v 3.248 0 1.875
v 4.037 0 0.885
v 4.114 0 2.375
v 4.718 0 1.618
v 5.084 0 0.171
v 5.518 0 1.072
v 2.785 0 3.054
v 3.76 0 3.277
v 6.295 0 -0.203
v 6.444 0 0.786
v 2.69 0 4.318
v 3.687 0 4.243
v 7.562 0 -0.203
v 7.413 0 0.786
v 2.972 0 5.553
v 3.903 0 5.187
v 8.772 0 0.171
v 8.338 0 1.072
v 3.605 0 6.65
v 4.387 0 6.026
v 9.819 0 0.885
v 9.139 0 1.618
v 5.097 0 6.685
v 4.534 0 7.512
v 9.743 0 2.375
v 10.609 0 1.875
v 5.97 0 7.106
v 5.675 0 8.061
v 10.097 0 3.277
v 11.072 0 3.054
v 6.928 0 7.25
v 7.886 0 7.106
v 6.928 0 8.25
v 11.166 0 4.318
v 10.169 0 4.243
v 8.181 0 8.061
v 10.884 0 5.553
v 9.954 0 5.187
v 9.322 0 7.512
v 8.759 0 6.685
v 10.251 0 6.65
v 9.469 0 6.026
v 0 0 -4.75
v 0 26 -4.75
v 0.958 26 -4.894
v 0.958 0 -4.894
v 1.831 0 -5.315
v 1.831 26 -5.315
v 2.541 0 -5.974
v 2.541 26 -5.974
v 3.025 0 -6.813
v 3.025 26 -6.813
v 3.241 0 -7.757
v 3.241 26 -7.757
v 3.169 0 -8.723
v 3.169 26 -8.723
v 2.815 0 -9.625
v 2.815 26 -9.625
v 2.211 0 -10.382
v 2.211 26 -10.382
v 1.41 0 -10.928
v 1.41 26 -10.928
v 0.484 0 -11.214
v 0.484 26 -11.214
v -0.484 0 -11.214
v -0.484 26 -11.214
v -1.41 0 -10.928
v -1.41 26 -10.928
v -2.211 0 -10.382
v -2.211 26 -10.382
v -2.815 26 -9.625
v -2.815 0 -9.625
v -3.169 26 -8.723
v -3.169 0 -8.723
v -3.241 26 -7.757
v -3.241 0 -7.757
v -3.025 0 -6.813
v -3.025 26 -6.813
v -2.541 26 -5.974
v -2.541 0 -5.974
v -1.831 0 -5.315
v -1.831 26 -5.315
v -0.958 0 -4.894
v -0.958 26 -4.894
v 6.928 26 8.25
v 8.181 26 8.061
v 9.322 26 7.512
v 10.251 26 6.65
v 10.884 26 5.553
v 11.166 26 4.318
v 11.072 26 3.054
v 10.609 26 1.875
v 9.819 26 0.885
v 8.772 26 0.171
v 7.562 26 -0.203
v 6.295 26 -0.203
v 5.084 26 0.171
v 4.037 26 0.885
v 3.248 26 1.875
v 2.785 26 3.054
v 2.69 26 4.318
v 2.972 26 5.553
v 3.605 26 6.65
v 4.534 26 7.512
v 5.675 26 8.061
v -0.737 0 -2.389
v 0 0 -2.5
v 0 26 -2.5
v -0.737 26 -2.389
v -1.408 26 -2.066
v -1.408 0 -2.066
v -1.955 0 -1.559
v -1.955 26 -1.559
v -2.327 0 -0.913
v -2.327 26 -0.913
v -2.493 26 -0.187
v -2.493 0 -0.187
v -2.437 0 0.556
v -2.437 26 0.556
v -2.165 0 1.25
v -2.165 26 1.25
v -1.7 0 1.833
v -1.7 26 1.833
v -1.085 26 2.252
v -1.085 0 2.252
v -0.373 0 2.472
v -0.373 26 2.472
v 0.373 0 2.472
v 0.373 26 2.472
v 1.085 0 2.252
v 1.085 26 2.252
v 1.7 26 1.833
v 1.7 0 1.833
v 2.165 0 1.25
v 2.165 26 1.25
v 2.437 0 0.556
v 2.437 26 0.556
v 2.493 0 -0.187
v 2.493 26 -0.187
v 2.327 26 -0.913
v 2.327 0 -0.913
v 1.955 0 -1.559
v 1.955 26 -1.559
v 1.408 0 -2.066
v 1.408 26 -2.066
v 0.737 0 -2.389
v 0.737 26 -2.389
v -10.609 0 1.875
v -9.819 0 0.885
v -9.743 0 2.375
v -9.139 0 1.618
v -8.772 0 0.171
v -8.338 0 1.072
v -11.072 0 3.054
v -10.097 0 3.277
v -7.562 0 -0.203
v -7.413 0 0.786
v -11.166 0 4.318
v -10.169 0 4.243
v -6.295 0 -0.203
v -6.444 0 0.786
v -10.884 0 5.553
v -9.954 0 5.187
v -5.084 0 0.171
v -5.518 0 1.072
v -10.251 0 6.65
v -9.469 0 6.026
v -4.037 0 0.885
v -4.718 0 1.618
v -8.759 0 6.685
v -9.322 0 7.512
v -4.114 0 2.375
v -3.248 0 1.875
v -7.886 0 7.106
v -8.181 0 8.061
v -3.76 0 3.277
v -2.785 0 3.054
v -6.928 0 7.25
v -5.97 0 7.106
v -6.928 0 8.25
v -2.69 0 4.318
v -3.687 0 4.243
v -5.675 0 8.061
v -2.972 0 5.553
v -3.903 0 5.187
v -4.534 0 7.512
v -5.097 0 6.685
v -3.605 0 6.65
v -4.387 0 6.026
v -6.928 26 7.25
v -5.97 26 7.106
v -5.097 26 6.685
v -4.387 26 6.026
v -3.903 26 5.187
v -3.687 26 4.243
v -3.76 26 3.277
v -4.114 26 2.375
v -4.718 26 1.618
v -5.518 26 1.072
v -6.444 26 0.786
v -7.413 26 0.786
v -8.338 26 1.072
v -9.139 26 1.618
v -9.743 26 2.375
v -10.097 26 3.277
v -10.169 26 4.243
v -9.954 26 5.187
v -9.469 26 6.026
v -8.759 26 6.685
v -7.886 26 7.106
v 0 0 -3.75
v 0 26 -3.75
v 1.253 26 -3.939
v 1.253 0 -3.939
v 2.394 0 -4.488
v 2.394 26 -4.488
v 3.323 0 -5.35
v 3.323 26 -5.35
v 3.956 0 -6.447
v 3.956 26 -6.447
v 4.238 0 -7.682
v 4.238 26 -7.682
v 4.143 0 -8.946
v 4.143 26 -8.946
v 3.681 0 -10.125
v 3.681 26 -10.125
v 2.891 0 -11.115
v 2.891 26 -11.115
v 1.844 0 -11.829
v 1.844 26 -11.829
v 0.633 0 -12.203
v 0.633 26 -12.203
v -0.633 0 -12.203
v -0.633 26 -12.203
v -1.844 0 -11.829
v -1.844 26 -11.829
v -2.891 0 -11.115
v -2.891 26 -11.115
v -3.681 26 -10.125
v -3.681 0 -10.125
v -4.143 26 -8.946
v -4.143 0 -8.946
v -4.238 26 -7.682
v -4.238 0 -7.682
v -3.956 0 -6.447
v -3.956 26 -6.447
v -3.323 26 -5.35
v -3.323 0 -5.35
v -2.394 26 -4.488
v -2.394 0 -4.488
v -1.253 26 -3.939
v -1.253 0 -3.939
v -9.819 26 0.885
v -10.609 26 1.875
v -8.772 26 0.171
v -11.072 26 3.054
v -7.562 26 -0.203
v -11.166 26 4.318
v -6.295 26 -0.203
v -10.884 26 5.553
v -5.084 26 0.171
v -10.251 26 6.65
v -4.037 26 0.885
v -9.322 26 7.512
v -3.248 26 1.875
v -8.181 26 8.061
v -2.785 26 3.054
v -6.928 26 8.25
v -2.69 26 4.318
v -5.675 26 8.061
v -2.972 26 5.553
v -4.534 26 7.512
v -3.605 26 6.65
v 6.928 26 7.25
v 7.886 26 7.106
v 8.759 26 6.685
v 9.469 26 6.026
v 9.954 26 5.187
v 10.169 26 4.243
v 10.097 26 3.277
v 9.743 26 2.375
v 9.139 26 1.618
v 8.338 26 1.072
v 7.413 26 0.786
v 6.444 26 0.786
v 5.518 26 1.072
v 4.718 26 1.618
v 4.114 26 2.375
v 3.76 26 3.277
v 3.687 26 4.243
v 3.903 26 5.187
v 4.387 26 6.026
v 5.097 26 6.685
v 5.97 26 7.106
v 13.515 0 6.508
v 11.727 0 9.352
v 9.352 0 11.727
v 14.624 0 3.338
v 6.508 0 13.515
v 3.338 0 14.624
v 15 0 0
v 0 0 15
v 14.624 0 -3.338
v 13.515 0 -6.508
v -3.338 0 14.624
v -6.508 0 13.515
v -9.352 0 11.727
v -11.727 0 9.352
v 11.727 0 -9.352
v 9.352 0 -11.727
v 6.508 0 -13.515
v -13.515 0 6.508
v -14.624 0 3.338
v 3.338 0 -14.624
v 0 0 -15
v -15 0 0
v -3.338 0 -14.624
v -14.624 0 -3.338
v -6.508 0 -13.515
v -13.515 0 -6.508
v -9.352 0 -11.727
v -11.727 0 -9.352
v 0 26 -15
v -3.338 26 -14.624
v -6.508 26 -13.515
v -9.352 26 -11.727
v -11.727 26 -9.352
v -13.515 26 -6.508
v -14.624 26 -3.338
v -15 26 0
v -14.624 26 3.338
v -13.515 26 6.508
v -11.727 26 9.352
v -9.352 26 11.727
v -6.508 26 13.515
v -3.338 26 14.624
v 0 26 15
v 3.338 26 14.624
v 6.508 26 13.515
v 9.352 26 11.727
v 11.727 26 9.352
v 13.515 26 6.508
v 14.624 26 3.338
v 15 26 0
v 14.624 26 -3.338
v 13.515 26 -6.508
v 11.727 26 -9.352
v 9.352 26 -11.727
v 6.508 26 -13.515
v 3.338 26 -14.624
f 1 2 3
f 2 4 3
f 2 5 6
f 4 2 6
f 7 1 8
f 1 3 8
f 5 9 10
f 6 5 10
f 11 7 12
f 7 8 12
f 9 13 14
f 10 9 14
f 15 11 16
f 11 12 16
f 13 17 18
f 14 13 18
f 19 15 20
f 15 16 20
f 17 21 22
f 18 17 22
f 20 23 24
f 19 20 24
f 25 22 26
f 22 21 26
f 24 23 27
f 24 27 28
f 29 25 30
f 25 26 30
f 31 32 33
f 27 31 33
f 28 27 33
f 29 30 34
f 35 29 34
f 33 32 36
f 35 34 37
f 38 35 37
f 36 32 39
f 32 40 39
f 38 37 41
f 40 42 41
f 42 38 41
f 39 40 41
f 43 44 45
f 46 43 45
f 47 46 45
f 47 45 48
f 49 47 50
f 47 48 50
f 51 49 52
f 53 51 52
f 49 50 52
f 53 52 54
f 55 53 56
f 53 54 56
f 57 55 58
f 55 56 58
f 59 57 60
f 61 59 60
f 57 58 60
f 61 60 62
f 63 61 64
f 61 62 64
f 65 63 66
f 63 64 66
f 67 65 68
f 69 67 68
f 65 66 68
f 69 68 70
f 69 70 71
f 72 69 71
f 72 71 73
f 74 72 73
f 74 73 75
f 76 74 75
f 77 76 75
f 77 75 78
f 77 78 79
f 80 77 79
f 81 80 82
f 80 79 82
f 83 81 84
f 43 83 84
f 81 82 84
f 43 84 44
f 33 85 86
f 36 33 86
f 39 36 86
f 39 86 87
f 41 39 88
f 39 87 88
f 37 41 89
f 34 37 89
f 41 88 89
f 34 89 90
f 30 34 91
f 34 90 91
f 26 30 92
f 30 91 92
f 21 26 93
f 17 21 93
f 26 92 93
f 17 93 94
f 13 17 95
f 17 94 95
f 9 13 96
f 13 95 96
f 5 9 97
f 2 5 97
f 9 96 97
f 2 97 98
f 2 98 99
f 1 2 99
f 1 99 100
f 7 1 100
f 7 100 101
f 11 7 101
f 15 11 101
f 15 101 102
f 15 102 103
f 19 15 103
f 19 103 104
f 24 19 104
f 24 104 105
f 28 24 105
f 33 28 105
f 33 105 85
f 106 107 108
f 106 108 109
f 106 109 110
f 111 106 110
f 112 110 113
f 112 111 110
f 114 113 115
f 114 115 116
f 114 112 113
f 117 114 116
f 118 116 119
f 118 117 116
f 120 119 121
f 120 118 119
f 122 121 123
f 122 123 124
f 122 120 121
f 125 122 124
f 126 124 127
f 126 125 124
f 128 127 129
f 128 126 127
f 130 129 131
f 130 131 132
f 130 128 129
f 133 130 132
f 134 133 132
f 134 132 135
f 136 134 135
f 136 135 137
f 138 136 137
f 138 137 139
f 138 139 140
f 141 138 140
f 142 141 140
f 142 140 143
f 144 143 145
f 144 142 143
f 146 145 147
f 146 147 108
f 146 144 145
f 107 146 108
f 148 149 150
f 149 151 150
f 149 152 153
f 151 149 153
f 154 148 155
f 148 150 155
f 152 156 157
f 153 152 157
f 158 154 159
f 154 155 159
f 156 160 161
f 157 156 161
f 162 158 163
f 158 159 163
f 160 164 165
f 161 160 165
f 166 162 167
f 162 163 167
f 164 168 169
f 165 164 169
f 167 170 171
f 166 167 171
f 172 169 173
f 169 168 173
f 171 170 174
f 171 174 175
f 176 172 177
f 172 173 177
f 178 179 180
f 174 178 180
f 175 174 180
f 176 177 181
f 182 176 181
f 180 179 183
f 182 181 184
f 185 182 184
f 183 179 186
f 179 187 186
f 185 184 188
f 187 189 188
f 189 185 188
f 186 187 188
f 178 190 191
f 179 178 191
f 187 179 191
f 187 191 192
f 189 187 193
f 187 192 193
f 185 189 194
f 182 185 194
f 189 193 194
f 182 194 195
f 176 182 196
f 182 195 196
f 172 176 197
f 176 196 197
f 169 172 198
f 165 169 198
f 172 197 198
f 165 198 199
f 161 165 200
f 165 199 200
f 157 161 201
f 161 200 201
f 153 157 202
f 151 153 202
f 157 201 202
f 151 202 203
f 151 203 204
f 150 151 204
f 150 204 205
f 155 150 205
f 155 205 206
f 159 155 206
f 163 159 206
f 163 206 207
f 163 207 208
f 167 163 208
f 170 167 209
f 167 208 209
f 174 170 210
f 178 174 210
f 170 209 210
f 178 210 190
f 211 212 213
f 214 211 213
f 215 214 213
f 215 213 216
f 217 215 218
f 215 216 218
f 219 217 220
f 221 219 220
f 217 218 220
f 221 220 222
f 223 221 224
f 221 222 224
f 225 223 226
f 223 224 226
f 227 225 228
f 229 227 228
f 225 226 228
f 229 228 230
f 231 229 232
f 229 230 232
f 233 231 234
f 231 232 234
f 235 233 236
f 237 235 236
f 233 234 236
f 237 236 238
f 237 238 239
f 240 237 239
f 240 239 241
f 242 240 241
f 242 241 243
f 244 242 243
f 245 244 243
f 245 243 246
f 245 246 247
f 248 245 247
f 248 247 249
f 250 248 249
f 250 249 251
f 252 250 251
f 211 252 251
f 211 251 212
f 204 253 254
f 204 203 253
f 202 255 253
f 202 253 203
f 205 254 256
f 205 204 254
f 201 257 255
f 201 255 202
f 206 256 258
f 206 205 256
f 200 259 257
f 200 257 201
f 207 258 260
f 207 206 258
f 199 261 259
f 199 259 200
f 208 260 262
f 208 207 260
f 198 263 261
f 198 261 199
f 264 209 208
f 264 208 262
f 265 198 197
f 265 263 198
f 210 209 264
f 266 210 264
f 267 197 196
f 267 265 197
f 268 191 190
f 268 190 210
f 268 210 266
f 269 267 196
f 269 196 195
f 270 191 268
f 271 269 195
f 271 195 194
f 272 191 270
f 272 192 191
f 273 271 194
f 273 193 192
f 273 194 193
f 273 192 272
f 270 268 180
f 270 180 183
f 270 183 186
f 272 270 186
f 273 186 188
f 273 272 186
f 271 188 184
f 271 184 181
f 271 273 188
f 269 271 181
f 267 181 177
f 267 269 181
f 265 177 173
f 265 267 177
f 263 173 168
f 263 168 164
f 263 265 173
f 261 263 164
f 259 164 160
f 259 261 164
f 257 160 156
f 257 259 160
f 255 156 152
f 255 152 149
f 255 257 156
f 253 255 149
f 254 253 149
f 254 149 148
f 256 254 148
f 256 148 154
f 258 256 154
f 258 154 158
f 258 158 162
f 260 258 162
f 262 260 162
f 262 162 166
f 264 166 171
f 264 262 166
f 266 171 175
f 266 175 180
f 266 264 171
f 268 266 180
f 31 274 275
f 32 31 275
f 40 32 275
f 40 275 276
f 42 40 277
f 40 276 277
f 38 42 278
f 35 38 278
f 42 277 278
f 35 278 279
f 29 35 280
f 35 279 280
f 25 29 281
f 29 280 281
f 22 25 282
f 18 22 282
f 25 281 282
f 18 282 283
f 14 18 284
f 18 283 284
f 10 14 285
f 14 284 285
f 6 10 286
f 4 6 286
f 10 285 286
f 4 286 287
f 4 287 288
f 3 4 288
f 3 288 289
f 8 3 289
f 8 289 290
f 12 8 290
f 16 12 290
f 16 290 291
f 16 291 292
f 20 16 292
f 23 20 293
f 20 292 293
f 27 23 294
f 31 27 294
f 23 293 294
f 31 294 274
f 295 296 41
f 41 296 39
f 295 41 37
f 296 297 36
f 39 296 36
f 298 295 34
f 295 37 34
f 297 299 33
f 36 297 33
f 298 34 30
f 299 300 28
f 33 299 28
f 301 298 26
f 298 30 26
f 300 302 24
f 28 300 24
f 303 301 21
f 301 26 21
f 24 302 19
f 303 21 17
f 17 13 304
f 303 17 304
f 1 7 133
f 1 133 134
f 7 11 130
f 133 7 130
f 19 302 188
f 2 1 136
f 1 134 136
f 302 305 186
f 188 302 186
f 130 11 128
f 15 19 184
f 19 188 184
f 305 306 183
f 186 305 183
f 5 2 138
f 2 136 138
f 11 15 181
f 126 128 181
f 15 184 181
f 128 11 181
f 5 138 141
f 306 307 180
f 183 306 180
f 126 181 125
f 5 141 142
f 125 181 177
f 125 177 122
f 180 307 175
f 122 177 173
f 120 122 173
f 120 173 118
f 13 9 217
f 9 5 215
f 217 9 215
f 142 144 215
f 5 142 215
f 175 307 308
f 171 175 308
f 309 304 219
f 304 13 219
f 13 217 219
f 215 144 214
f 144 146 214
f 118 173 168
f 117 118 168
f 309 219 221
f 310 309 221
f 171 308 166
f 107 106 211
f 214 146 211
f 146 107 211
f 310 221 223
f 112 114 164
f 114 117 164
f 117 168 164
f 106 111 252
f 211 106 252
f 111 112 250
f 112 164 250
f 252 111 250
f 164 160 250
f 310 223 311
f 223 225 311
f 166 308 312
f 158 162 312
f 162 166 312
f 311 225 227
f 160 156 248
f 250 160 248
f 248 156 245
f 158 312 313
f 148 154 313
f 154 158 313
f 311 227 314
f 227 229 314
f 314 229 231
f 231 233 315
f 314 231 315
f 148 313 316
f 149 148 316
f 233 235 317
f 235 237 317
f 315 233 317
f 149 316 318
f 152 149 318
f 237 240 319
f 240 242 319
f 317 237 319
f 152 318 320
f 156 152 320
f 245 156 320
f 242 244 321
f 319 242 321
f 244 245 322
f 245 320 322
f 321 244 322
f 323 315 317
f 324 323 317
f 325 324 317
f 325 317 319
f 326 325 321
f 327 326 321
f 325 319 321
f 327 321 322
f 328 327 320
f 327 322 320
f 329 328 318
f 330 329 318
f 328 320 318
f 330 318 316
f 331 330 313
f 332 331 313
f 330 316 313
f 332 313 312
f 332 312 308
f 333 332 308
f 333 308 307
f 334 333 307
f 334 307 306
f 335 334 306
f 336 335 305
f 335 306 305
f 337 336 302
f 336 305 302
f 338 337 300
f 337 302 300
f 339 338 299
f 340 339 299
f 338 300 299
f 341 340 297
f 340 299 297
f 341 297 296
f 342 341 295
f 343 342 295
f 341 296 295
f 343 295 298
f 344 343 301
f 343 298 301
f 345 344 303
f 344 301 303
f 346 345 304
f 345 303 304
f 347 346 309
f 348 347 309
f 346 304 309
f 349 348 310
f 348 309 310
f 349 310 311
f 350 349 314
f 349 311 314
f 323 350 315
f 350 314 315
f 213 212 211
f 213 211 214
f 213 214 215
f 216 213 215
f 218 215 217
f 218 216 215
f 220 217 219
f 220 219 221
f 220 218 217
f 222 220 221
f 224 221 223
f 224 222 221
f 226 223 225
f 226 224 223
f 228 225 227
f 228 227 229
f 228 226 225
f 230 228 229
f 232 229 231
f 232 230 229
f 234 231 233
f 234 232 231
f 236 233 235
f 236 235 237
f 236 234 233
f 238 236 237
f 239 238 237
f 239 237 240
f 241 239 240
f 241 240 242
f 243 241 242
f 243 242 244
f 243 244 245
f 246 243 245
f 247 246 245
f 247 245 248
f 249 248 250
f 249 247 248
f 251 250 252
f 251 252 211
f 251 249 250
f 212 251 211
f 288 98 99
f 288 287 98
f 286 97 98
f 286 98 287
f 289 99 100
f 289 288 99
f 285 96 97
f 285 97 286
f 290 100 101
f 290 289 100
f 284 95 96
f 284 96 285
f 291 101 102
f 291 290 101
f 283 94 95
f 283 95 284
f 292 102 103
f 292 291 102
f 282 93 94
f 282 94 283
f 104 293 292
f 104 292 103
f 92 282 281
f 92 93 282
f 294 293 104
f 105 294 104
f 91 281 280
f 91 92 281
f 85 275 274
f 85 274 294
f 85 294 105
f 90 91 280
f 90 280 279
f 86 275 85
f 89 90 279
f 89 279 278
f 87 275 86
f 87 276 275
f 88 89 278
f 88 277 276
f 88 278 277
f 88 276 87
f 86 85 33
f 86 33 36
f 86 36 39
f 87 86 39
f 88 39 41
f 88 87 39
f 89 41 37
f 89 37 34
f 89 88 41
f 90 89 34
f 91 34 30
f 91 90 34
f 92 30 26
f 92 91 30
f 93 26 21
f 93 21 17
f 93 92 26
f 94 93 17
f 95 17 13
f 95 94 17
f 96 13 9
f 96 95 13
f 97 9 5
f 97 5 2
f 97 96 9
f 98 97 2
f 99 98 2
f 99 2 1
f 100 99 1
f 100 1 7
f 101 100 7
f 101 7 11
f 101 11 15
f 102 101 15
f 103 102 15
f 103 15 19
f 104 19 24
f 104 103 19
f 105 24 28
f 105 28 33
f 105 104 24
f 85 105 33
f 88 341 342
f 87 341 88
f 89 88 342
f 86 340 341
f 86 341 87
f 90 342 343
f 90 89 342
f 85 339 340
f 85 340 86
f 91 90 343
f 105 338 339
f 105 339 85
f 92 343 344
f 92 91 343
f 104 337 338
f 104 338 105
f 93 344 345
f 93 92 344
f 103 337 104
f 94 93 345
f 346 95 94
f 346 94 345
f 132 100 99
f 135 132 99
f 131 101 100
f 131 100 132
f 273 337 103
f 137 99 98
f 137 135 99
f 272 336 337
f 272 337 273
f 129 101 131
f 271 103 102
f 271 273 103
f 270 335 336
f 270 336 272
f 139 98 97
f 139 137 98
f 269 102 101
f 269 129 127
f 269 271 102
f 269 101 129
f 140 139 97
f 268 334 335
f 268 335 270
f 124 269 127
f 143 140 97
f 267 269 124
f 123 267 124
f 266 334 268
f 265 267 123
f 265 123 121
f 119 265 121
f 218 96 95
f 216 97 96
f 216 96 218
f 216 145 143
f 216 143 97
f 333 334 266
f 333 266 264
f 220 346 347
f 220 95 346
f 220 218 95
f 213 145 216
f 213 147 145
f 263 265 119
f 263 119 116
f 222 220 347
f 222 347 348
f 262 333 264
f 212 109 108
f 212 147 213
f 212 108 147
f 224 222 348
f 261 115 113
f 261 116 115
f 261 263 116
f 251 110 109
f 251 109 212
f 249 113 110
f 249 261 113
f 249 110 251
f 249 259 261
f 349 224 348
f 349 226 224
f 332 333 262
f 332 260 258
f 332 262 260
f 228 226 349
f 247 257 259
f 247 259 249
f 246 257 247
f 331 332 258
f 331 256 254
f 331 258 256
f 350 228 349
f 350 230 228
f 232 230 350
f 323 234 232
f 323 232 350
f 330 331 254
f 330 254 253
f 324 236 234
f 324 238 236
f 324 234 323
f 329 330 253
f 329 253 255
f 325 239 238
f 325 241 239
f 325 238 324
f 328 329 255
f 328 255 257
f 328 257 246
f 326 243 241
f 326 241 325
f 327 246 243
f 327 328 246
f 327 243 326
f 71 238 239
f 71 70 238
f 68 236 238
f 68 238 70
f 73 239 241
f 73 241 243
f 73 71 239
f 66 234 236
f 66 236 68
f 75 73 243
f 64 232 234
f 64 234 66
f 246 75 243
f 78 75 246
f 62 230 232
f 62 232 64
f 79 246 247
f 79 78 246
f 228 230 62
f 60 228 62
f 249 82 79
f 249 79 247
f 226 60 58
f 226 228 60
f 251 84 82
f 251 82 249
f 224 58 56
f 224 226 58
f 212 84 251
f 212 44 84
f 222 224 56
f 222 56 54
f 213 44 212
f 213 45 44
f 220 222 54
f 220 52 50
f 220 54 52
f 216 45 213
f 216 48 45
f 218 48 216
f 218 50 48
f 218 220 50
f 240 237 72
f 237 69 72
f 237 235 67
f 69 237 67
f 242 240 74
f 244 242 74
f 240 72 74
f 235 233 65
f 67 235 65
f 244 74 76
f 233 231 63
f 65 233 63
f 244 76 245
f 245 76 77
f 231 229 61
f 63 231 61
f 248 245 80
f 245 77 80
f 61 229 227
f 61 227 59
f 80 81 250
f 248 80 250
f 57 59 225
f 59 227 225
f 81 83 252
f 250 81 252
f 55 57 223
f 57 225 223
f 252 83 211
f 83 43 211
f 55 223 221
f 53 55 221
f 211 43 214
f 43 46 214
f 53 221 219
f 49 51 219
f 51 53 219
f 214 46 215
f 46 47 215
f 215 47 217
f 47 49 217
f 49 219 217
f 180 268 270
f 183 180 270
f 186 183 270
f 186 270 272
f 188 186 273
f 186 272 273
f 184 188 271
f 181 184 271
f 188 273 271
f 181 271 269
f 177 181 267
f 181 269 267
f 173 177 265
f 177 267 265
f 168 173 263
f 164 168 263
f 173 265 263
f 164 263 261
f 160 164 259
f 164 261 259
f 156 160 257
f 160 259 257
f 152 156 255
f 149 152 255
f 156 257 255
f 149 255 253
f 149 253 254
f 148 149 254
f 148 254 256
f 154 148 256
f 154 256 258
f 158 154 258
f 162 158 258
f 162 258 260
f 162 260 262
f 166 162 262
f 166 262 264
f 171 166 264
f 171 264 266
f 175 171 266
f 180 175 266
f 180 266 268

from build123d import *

# Parameters (mm, degrees)
IZIM1_R                       = 15
IZIM1_R_2                     = 2.5
Y_KSEKLIK_EKSTR_ZYON1_DEPTH   = 26
IZIM2_R                       = 4.25
KES_EKSTR_ZYON2_DEPTH         = 34.555923471
IZIM5_R                       = 4.25
IZIM5_R_2                     = 3.25
Y_KSEKLIK_EKSTR_ZYON4_DEPTH   = 26
Y_KSEKLIK_EKSTR_ZYON4_2_DEPTH = 26
Y_KSEKLIK_EKSTR_ZYON4_3_DEPTH = 26


with BuildPart() as part:
    # Çizim1 → Yükseklik-Ekstrüzyon1 (new body)
    with BuildSketch(Plane(origin=(0, 0, 0), x_dir=(1, 0, 0), z_dir=(0, 1, 0))):
        with Locations(Location((0, 0, 0), (0, 0, 90))):
            Circle(IZIM1_R)
        with Locations(Location((0, 0, 0), (0, 0, 90))):
            Circle(IZIM1_R_2, mode=Mode.SUBTRACT)
    extrude(amount=Y_KSEKLIK_EKSTR_ZYON1_DEPTH)

    # Çizim2 → Kes-Ekstrüzyon2 (cut, through all)
    with BuildSketch(Plane(origin=(0, 26, 0), x_dir=(1, 0, 0), z_dir=(0, 1, 0))):
        with Locations(Location((0, 8, 0), (0, 0, 270))):
            Circle(IZIM2_R)
        with Locations(Location((6.92820323, -4, 0), (0, 0, 270))):
            Circle(IZIM2_R)
        with Locations(Location((-6.92820323, -4, 0), (0, 0, 270))):
            Circle(IZIM2_R)
    extrude(amount=-KES_EKSTR_ZYON2_DEPTH, mode=Mode.SUBTRACT)


with BuildPart() as body_2:
    # Çizim5 → Yükseklik-Ekstrüzyon4 (new, through all)
    with BuildSketch(Plane(origin=(0, 26, 0), x_dir=(1, 0, 0), z_dir=(0, 1, 0))):
        with Locations(Location((6.92820323, -4, 0), (0, 0, 270))):
            Circle(IZIM5_R)
        with Locations(Location((6.92820323, -4, 0), (0, 0, 270))):
            Circle(IZIM5_R_2, mode=Mode.SUBTRACT)
    extrude(amount=-Y_KSEKLIK_EKSTR_ZYON4_DEPTH)


with BuildPart() as body_3:
    # Çizim5 → Y_kseklik-Ekstr_zyon4 2 (new, through all)
    with BuildSketch(Plane(origin=(0, 26, 0), x_dir=(1, 0, 0), z_dir=(0, 1, 0))):
        with Locations(Location((-6.92820323, -4, 0), (0, 0, 270))):
            Circle(IZIM5_R)
        with Locations(Location((-6.92820323, -4, 0), (0, 0, 270))):
            Circle(IZIM5_R_2, mode=Mode.SUBTRACT)
    extrude(amount=-Y_KSEKLIK_EKSTR_ZYON4_2_DEPTH)


with BuildPart() as body_4:
    # Çizim5 → Y_kseklik-Ekstr_zyon4 3 (new, through all)
    with BuildSketch(Plane(origin=(0, 26, 0), x_dir=(1, 0, 0), z_dir=(0, 1, 0))):
        with Locations(Location((0, 8, 0), (0, 0, 270))):
            Circle(IZIM5_R)
        with Locations(Location((0, 8, 0), (0, 0, 270))):
            Circle(IZIM5_R_2, mode=Mode.SUBTRACT)
    extrude(amount=-Y_KSEKLIK_EKSTR_ZYON4_3_DEPTH)


solid = Compound([part.part, body_2.part, body_3.part, body_4.part])
